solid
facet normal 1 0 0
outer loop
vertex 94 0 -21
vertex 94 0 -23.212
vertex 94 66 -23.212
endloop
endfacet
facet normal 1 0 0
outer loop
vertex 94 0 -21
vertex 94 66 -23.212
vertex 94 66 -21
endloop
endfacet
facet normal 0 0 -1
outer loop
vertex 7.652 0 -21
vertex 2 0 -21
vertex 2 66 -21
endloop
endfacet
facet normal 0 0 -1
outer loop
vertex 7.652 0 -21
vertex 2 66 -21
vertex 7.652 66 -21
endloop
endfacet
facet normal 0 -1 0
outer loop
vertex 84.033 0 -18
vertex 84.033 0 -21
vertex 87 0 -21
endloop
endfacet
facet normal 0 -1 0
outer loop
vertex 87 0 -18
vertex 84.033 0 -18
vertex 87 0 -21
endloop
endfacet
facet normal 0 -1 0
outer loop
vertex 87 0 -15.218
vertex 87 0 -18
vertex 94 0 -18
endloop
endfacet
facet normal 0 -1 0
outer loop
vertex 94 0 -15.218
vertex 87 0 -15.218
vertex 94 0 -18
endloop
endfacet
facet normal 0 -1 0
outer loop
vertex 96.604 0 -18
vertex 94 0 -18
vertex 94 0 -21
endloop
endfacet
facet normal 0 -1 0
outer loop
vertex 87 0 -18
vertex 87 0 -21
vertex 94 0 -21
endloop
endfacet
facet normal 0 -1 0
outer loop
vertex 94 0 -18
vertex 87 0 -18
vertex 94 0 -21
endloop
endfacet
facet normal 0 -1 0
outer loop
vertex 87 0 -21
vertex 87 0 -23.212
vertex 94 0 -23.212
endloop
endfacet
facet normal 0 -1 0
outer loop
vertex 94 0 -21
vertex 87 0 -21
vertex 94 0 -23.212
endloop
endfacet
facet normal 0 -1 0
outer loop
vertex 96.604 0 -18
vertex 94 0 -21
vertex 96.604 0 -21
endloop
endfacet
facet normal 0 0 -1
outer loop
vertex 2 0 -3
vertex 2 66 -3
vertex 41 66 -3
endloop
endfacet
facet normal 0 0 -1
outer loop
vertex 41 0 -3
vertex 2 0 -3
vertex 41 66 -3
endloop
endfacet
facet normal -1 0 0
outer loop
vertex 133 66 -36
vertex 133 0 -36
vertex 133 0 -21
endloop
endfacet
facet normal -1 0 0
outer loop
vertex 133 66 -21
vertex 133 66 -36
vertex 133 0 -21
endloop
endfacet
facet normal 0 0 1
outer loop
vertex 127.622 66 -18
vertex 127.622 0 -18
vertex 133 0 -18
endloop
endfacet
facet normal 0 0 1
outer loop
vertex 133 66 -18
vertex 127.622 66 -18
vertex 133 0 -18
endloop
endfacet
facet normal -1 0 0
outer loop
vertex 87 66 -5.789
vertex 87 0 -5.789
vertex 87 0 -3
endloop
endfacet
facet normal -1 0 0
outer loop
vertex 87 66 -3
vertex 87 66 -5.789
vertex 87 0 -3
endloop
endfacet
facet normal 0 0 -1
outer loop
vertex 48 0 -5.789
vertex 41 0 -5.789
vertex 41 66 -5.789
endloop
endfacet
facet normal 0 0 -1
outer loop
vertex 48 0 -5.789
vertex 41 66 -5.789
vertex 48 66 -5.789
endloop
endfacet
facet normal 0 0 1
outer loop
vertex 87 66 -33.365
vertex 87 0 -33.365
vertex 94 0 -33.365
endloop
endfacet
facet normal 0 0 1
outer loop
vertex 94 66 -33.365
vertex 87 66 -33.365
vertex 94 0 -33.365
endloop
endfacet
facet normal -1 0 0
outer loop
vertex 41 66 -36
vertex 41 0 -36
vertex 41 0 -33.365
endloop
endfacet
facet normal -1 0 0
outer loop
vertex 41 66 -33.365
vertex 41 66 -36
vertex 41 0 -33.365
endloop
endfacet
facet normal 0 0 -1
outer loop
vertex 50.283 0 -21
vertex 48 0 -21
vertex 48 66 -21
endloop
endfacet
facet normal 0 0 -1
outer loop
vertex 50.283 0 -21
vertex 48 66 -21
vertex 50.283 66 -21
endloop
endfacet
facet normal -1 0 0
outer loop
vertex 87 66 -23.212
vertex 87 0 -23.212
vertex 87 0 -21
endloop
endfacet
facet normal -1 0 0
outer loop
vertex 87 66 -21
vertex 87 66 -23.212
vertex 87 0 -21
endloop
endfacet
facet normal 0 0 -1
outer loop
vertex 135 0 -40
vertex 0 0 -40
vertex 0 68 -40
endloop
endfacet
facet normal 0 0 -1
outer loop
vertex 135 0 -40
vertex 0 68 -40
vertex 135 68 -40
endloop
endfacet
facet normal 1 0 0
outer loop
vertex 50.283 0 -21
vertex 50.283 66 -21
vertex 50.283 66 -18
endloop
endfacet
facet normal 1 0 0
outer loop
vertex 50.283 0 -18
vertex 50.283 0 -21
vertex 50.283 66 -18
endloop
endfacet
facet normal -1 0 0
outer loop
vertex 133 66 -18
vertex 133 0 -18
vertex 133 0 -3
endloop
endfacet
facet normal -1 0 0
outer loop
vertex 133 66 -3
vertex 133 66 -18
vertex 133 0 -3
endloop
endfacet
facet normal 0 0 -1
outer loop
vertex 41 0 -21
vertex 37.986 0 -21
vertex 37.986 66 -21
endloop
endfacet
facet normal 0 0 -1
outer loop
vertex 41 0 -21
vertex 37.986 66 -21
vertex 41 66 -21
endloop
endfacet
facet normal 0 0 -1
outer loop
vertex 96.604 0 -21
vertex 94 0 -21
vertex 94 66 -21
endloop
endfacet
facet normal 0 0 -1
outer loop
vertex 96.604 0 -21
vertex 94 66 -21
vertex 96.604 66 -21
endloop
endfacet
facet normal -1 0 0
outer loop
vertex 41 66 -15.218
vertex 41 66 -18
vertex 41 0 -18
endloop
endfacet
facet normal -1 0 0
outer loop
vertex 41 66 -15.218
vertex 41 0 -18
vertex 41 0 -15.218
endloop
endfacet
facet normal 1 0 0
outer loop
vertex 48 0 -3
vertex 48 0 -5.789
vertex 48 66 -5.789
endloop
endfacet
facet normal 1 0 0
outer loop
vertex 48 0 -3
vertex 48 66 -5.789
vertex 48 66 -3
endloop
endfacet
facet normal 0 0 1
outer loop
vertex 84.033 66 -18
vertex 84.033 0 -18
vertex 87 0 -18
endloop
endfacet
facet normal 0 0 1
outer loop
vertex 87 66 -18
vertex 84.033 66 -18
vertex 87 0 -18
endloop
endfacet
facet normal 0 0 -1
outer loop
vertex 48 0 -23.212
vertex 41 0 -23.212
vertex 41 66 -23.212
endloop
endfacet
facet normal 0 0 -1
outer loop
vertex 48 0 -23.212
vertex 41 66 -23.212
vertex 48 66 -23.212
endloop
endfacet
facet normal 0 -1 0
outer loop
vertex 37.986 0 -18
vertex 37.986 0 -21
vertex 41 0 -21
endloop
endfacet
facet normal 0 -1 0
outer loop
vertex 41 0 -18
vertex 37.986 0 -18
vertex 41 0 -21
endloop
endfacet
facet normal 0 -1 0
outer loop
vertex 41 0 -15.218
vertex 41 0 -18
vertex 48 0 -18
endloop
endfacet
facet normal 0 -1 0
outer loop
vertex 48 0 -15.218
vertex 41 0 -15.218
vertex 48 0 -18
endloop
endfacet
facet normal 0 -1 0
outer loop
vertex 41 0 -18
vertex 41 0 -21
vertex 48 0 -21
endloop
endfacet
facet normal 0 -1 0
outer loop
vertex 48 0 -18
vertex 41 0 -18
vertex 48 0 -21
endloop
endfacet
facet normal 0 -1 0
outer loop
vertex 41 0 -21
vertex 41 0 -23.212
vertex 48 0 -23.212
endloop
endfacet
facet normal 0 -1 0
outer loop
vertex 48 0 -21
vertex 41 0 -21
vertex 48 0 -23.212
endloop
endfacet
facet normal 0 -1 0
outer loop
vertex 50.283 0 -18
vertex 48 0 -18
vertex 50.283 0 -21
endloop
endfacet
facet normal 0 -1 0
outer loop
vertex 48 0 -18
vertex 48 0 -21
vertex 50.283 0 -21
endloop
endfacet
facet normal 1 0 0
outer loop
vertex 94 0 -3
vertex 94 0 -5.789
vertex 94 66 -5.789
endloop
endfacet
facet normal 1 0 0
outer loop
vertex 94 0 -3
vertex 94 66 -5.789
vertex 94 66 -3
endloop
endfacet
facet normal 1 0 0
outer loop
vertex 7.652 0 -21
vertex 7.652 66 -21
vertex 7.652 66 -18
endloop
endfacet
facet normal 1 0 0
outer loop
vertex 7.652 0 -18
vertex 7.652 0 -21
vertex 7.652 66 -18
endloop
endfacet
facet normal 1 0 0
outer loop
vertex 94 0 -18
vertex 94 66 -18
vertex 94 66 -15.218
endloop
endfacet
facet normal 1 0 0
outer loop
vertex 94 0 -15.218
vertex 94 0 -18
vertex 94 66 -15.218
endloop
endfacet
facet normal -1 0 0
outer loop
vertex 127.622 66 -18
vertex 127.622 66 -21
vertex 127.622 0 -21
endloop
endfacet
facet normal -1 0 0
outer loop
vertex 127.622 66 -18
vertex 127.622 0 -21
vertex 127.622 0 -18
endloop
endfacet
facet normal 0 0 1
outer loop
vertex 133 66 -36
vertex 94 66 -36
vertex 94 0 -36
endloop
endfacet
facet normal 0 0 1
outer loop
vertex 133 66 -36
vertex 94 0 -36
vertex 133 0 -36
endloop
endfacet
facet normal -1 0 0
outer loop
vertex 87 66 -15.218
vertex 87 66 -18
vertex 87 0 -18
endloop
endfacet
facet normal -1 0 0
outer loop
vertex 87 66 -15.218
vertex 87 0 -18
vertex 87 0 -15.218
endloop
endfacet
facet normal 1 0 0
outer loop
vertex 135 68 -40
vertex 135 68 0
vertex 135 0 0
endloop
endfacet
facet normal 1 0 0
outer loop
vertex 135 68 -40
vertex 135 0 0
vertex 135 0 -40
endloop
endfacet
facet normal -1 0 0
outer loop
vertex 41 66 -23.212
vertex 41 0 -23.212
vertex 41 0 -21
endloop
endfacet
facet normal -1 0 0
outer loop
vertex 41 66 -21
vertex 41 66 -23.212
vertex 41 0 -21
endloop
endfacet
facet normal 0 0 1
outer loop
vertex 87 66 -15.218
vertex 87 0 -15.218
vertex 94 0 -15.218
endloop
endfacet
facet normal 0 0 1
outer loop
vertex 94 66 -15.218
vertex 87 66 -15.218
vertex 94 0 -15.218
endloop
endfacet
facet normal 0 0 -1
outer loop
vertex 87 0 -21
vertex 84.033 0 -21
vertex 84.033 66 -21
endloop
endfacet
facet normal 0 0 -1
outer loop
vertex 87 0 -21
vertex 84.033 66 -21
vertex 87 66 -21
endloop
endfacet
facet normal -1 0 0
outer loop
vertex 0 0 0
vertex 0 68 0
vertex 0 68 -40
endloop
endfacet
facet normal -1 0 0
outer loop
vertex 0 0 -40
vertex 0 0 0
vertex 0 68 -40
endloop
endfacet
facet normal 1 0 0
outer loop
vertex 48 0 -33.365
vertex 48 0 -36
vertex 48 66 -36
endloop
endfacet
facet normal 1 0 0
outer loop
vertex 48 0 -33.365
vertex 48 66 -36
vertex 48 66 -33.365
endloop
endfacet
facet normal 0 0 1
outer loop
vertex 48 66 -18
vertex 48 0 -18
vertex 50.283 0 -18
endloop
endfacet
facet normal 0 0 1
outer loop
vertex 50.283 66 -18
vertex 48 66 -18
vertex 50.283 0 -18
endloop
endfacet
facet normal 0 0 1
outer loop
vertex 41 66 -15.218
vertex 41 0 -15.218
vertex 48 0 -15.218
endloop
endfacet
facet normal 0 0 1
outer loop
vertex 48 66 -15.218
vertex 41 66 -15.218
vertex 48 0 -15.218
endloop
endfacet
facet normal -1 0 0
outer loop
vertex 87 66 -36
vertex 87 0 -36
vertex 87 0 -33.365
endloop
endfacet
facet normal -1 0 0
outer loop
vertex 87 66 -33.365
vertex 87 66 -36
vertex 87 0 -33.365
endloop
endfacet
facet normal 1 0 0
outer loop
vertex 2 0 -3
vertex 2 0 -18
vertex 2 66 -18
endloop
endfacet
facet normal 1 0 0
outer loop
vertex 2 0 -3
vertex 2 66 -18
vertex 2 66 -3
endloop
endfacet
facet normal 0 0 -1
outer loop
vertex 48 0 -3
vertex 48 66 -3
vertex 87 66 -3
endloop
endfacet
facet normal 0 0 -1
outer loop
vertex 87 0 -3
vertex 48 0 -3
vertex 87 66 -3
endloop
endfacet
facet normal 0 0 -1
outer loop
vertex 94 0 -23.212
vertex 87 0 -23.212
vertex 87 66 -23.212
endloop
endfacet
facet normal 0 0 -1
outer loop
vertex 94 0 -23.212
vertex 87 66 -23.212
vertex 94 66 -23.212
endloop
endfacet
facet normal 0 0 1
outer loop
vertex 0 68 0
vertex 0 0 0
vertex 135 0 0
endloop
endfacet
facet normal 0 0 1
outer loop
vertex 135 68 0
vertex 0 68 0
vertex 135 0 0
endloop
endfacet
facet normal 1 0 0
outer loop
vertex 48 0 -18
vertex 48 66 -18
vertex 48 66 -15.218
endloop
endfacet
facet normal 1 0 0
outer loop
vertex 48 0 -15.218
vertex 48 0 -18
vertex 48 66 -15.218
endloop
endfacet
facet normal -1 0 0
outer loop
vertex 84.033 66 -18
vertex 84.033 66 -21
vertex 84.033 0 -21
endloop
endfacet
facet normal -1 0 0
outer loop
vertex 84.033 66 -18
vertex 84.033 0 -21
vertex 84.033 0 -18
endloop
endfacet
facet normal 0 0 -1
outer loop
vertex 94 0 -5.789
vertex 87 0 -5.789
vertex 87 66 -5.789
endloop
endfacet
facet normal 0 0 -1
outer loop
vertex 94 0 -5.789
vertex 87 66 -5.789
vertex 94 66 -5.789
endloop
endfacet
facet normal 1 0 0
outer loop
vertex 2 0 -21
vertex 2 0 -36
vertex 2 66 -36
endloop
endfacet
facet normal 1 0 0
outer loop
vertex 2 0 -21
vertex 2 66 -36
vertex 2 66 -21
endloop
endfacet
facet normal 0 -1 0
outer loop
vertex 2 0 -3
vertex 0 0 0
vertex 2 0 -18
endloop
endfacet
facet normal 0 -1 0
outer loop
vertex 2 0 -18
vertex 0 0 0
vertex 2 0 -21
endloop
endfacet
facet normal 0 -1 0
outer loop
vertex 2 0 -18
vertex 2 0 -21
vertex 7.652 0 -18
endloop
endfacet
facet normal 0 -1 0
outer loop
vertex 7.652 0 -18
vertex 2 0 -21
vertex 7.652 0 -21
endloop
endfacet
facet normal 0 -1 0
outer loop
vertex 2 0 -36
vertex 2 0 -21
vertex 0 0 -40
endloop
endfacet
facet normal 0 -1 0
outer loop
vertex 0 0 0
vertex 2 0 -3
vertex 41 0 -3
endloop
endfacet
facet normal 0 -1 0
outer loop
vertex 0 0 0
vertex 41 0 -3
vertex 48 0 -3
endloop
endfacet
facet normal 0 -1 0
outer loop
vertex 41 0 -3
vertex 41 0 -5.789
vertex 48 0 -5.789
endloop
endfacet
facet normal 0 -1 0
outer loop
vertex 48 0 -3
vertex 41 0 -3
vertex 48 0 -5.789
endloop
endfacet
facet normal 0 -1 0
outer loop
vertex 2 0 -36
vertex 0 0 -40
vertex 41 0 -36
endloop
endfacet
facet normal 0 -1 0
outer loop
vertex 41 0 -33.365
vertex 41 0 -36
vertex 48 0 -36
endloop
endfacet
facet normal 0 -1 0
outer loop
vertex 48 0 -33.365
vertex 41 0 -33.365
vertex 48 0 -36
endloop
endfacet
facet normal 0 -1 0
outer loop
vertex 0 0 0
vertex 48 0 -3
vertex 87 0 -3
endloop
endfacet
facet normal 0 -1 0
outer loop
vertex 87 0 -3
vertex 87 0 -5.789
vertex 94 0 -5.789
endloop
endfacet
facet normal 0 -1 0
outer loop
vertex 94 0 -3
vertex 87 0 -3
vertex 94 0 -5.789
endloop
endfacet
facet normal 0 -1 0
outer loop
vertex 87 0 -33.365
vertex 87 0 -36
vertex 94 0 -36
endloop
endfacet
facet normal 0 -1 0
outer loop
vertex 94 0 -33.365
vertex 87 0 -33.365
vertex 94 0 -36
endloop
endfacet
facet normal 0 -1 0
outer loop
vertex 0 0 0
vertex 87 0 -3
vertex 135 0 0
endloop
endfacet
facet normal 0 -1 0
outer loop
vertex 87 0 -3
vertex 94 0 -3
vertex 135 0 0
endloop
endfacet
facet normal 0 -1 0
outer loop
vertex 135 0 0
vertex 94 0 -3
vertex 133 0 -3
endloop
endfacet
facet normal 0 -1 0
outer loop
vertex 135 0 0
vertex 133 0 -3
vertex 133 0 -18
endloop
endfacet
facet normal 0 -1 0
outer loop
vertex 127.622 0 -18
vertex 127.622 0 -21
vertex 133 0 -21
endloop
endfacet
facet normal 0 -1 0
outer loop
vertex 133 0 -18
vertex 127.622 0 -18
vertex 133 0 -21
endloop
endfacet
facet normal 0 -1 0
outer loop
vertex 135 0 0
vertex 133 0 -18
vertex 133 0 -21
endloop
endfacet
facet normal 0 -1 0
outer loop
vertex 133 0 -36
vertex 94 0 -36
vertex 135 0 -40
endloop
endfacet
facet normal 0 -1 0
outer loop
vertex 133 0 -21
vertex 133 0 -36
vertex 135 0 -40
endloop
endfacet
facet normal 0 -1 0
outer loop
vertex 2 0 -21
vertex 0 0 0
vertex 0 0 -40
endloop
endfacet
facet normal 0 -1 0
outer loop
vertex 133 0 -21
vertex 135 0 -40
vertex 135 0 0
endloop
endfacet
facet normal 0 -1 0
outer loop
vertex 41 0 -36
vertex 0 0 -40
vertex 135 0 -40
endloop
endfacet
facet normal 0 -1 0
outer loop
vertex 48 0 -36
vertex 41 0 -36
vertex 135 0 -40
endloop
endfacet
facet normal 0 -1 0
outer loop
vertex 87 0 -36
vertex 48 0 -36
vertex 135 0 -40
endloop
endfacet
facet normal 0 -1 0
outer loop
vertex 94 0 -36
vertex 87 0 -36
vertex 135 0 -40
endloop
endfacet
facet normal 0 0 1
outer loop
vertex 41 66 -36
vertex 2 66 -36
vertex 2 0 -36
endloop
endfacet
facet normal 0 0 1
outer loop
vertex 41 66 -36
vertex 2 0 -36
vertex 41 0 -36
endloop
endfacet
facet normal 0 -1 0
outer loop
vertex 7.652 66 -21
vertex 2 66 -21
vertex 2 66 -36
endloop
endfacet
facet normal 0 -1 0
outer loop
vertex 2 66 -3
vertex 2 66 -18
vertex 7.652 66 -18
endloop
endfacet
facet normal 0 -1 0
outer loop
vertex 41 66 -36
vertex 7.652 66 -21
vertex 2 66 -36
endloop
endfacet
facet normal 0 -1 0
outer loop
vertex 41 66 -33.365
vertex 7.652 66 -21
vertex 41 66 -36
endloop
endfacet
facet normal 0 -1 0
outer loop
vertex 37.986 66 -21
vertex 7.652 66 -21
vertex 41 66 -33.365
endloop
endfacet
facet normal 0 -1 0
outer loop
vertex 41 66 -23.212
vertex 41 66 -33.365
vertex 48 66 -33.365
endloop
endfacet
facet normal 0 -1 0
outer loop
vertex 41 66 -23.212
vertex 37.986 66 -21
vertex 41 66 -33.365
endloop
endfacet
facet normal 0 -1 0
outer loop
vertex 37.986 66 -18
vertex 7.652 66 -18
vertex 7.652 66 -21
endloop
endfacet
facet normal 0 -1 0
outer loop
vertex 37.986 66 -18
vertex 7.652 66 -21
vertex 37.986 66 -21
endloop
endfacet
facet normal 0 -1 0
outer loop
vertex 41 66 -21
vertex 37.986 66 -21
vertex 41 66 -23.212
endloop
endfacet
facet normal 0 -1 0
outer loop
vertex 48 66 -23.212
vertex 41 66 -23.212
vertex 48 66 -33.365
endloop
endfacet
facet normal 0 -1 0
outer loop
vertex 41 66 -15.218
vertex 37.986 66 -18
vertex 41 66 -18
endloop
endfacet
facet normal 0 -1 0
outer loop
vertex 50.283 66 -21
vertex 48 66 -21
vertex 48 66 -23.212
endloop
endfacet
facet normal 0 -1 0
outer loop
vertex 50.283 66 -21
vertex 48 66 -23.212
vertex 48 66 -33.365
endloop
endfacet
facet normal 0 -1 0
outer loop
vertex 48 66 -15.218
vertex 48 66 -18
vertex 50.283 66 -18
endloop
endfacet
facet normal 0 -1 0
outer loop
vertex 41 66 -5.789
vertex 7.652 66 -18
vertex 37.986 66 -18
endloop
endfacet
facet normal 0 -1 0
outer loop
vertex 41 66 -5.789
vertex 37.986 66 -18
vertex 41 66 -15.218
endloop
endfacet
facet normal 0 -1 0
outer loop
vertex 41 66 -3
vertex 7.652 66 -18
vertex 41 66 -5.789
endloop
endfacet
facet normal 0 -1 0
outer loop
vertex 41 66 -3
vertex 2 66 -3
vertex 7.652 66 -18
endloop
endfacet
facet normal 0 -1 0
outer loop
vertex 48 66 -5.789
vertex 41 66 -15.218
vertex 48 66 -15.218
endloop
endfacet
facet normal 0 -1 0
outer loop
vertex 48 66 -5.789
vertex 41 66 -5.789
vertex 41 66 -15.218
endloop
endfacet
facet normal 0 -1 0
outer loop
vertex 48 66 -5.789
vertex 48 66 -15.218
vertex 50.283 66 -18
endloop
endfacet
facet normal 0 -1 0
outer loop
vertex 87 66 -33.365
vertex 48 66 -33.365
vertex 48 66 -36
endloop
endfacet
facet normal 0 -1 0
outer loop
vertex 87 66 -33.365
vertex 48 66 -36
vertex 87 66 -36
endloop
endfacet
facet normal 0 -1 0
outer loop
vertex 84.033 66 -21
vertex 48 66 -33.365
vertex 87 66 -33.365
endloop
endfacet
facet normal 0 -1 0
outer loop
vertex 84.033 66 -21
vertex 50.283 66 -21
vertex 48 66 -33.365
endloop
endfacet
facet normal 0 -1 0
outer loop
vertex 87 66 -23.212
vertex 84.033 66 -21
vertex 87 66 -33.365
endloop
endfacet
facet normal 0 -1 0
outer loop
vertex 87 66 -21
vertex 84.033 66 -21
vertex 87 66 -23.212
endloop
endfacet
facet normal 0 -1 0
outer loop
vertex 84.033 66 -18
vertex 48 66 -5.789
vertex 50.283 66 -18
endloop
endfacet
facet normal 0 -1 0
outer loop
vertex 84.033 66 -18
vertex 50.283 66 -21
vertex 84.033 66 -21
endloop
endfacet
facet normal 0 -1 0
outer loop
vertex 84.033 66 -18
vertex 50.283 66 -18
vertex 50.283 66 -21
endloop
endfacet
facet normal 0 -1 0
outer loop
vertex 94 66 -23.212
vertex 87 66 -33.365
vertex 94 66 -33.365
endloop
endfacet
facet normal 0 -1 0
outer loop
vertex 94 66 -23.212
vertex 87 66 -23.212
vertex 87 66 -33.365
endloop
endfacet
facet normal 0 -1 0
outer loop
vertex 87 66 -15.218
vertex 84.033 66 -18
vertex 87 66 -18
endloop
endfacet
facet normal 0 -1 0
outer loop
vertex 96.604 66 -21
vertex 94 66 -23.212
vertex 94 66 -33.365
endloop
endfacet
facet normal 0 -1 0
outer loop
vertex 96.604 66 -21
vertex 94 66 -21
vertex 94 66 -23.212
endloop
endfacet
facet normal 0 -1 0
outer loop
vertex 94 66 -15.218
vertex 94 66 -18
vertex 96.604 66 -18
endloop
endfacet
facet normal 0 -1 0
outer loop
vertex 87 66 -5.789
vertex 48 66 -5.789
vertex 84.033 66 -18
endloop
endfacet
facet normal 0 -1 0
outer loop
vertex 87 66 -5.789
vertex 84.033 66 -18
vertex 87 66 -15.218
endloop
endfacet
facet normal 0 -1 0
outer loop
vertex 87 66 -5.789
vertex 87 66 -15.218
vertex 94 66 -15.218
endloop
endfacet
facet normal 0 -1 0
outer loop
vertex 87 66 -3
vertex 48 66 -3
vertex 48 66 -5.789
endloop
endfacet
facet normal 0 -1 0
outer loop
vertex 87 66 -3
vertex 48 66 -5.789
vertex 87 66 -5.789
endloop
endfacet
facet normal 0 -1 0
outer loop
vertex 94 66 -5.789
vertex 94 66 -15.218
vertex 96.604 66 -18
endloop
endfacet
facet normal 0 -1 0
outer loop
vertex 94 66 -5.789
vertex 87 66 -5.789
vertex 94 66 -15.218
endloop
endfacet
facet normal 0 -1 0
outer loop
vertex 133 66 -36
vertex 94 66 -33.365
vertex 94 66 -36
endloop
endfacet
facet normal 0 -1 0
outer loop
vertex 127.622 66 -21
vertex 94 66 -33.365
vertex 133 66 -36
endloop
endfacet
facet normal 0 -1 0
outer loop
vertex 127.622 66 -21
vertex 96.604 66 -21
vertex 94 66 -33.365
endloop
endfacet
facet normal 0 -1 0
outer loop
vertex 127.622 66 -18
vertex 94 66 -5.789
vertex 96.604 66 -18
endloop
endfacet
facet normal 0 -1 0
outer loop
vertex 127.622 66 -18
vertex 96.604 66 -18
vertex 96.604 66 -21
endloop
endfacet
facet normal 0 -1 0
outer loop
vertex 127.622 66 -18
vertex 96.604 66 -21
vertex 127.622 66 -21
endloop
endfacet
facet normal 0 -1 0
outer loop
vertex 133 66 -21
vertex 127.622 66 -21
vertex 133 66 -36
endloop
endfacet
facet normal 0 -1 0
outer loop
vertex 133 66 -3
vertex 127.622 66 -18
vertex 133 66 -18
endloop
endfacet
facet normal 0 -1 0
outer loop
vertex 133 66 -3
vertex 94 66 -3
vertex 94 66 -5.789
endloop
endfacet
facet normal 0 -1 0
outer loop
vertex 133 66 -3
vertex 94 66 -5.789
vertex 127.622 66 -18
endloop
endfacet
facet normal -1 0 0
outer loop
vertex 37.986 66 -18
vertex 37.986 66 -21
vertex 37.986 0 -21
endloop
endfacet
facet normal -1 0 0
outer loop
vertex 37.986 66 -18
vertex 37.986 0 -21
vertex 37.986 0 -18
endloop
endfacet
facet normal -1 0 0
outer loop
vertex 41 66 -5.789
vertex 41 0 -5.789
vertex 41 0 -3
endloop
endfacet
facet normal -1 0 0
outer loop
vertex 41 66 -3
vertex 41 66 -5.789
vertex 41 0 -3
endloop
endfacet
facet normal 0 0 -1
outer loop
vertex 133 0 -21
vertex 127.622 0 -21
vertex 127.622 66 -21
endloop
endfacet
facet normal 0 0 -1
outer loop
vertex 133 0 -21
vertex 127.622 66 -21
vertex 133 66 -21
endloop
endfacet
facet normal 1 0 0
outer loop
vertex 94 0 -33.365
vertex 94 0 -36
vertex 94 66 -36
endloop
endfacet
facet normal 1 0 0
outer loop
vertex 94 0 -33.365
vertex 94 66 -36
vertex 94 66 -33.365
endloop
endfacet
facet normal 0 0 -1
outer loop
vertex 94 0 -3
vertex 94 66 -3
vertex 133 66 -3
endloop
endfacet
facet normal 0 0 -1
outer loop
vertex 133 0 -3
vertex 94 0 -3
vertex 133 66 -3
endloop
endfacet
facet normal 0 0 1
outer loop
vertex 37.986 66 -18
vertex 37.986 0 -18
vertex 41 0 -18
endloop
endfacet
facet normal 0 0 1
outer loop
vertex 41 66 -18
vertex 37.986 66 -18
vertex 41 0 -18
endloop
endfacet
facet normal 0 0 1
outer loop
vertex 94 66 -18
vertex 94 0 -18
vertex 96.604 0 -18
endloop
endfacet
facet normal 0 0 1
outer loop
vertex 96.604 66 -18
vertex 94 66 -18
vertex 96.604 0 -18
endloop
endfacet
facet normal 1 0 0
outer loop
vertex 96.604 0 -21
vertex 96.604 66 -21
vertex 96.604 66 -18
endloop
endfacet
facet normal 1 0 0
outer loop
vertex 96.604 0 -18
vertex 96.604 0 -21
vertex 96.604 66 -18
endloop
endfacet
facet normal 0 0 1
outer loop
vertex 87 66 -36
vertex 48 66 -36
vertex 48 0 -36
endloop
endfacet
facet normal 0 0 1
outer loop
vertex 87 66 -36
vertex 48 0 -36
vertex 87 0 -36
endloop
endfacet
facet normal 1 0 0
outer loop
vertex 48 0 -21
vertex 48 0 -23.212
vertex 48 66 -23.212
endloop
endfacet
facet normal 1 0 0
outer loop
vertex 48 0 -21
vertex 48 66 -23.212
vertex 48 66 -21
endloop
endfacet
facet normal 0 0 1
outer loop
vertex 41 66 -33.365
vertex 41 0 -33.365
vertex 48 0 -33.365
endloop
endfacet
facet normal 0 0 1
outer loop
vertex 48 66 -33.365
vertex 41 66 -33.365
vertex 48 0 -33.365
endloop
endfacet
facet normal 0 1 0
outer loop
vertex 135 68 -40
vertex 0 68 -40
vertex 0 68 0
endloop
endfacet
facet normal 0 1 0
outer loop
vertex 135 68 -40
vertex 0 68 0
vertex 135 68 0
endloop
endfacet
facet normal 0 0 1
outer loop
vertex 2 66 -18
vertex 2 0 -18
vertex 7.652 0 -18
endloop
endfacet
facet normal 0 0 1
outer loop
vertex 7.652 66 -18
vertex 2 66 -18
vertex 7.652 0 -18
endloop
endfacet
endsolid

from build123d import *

# Parameters (mm, degrees)
SKETCH_1_W          = 135
SKETCH_1_H          = 40
EXTRUDE_310_DEPTH   = 68
SKETCH_2_W          = 39
SKETCH_2_H          = 15
CUT_EXTRUDE_1_DEPTH = 66
SKETCH_4_W          = 53
SKETCH_4_H          = 9.428155193
CUT_EXTRUDE_2_DEPTH = 66
SKETCH_6_W          = 53
SKETCH_6_H          = 10.153175229
CUT_EXTRUDE_3_DEPTH = 66
SKETCH_7_W          = 30.334064535
SKETCH_7_H          = 3
SKETCH_7_W_2        = 33.750062794
SKETCH_7_W_3        = 31.017264187
CUT_EXTRUDE_4_DEPTH = 66


with BuildPart() as part:
    # Эскиз1 → Extrude 310 (new body)
    with BuildSketch(Plane(origin=(0, 0, 0), x_dir=(1, 0, 0), z_dir=(0, 1, 0))):
        with Locations((67.5, 20)):
            Rectangle(SKETCH_1_W, SKETCH_1_H)
    extrude(amount=EXTRUDE_310_DEPTH)

    # Эскиз2 → Вырез-Вытянуть1 (cut)
    with BuildSketch(Plane.XZ):
        with Locations((21.5, -10.5)):
            Rectangle(SKETCH_2_W, SKETCH_2_H)
        with Locations((67.5, -10.5)):
            Rectangle(SKETCH_2_W, SKETCH_2_H)
        with Locations((113.5, -10.5)):
            Rectangle(SKETCH_2_W, SKETCH_2_H)
        with Locations((67.5, -28.5)):
            Rectangle(SKETCH_2_W, SKETCH_2_H)
        with Locations((113.5, -28.5)):
            Rectangle(SKETCH_2_W, SKETCH_2_H)
        with Locations((21.5, -28.5)):
            Rectangle(SKETCH_2_W, SKETCH_2_H)
    extrude(amount=-CUT_EXTRUDE_1_DEPTH, mode=Mode.SUBTRACT)

    # Эскиз4 → Вырез-Вытянуть2 (cut)
    with BuildSketch(Plane.XZ):
        with Locations((67.5, -10.503524842)):
            Rectangle(SKETCH_4_W, SKETCH_4_H)
    extrude(amount=-CUT_EXTRUDE_2_DEPTH, mode=Mode.SUBTRACT)

    # Эскиз6 → Вырез-Вытянуть3 (cut)
    with BuildSketch(Plane.XZ):
        with Locations((67.5, -28.288326327)):
            Rectangle(SKETCH_6_W, SKETCH_6_H)
    extrude(amount=-CUT_EXTRUDE_3_DEPTH, mode=Mode.SUBTRACT)

    # Эскиз7 → Вырез-Вытянуть4 (cut)
    with BuildSketch(Plane.XZ):
        with Locations((22.818742778, -19.5)):
            Rectangle(SKETCH_7_W, SKETCH_7_H)
        with Locations((67.158400174, -19.5)):
            Rectangle(SKETCH_7_W_2, SKETCH_7_H)
        with Locations((112.112937257, -19.5)):
            Rectangle(SKETCH_7_W_3, SKETCH_7_H)
    extrude(amount=-CUT_EXTRUDE_4_DEPTH, mode=Mode.SUBTRACT)


solid = part.part
